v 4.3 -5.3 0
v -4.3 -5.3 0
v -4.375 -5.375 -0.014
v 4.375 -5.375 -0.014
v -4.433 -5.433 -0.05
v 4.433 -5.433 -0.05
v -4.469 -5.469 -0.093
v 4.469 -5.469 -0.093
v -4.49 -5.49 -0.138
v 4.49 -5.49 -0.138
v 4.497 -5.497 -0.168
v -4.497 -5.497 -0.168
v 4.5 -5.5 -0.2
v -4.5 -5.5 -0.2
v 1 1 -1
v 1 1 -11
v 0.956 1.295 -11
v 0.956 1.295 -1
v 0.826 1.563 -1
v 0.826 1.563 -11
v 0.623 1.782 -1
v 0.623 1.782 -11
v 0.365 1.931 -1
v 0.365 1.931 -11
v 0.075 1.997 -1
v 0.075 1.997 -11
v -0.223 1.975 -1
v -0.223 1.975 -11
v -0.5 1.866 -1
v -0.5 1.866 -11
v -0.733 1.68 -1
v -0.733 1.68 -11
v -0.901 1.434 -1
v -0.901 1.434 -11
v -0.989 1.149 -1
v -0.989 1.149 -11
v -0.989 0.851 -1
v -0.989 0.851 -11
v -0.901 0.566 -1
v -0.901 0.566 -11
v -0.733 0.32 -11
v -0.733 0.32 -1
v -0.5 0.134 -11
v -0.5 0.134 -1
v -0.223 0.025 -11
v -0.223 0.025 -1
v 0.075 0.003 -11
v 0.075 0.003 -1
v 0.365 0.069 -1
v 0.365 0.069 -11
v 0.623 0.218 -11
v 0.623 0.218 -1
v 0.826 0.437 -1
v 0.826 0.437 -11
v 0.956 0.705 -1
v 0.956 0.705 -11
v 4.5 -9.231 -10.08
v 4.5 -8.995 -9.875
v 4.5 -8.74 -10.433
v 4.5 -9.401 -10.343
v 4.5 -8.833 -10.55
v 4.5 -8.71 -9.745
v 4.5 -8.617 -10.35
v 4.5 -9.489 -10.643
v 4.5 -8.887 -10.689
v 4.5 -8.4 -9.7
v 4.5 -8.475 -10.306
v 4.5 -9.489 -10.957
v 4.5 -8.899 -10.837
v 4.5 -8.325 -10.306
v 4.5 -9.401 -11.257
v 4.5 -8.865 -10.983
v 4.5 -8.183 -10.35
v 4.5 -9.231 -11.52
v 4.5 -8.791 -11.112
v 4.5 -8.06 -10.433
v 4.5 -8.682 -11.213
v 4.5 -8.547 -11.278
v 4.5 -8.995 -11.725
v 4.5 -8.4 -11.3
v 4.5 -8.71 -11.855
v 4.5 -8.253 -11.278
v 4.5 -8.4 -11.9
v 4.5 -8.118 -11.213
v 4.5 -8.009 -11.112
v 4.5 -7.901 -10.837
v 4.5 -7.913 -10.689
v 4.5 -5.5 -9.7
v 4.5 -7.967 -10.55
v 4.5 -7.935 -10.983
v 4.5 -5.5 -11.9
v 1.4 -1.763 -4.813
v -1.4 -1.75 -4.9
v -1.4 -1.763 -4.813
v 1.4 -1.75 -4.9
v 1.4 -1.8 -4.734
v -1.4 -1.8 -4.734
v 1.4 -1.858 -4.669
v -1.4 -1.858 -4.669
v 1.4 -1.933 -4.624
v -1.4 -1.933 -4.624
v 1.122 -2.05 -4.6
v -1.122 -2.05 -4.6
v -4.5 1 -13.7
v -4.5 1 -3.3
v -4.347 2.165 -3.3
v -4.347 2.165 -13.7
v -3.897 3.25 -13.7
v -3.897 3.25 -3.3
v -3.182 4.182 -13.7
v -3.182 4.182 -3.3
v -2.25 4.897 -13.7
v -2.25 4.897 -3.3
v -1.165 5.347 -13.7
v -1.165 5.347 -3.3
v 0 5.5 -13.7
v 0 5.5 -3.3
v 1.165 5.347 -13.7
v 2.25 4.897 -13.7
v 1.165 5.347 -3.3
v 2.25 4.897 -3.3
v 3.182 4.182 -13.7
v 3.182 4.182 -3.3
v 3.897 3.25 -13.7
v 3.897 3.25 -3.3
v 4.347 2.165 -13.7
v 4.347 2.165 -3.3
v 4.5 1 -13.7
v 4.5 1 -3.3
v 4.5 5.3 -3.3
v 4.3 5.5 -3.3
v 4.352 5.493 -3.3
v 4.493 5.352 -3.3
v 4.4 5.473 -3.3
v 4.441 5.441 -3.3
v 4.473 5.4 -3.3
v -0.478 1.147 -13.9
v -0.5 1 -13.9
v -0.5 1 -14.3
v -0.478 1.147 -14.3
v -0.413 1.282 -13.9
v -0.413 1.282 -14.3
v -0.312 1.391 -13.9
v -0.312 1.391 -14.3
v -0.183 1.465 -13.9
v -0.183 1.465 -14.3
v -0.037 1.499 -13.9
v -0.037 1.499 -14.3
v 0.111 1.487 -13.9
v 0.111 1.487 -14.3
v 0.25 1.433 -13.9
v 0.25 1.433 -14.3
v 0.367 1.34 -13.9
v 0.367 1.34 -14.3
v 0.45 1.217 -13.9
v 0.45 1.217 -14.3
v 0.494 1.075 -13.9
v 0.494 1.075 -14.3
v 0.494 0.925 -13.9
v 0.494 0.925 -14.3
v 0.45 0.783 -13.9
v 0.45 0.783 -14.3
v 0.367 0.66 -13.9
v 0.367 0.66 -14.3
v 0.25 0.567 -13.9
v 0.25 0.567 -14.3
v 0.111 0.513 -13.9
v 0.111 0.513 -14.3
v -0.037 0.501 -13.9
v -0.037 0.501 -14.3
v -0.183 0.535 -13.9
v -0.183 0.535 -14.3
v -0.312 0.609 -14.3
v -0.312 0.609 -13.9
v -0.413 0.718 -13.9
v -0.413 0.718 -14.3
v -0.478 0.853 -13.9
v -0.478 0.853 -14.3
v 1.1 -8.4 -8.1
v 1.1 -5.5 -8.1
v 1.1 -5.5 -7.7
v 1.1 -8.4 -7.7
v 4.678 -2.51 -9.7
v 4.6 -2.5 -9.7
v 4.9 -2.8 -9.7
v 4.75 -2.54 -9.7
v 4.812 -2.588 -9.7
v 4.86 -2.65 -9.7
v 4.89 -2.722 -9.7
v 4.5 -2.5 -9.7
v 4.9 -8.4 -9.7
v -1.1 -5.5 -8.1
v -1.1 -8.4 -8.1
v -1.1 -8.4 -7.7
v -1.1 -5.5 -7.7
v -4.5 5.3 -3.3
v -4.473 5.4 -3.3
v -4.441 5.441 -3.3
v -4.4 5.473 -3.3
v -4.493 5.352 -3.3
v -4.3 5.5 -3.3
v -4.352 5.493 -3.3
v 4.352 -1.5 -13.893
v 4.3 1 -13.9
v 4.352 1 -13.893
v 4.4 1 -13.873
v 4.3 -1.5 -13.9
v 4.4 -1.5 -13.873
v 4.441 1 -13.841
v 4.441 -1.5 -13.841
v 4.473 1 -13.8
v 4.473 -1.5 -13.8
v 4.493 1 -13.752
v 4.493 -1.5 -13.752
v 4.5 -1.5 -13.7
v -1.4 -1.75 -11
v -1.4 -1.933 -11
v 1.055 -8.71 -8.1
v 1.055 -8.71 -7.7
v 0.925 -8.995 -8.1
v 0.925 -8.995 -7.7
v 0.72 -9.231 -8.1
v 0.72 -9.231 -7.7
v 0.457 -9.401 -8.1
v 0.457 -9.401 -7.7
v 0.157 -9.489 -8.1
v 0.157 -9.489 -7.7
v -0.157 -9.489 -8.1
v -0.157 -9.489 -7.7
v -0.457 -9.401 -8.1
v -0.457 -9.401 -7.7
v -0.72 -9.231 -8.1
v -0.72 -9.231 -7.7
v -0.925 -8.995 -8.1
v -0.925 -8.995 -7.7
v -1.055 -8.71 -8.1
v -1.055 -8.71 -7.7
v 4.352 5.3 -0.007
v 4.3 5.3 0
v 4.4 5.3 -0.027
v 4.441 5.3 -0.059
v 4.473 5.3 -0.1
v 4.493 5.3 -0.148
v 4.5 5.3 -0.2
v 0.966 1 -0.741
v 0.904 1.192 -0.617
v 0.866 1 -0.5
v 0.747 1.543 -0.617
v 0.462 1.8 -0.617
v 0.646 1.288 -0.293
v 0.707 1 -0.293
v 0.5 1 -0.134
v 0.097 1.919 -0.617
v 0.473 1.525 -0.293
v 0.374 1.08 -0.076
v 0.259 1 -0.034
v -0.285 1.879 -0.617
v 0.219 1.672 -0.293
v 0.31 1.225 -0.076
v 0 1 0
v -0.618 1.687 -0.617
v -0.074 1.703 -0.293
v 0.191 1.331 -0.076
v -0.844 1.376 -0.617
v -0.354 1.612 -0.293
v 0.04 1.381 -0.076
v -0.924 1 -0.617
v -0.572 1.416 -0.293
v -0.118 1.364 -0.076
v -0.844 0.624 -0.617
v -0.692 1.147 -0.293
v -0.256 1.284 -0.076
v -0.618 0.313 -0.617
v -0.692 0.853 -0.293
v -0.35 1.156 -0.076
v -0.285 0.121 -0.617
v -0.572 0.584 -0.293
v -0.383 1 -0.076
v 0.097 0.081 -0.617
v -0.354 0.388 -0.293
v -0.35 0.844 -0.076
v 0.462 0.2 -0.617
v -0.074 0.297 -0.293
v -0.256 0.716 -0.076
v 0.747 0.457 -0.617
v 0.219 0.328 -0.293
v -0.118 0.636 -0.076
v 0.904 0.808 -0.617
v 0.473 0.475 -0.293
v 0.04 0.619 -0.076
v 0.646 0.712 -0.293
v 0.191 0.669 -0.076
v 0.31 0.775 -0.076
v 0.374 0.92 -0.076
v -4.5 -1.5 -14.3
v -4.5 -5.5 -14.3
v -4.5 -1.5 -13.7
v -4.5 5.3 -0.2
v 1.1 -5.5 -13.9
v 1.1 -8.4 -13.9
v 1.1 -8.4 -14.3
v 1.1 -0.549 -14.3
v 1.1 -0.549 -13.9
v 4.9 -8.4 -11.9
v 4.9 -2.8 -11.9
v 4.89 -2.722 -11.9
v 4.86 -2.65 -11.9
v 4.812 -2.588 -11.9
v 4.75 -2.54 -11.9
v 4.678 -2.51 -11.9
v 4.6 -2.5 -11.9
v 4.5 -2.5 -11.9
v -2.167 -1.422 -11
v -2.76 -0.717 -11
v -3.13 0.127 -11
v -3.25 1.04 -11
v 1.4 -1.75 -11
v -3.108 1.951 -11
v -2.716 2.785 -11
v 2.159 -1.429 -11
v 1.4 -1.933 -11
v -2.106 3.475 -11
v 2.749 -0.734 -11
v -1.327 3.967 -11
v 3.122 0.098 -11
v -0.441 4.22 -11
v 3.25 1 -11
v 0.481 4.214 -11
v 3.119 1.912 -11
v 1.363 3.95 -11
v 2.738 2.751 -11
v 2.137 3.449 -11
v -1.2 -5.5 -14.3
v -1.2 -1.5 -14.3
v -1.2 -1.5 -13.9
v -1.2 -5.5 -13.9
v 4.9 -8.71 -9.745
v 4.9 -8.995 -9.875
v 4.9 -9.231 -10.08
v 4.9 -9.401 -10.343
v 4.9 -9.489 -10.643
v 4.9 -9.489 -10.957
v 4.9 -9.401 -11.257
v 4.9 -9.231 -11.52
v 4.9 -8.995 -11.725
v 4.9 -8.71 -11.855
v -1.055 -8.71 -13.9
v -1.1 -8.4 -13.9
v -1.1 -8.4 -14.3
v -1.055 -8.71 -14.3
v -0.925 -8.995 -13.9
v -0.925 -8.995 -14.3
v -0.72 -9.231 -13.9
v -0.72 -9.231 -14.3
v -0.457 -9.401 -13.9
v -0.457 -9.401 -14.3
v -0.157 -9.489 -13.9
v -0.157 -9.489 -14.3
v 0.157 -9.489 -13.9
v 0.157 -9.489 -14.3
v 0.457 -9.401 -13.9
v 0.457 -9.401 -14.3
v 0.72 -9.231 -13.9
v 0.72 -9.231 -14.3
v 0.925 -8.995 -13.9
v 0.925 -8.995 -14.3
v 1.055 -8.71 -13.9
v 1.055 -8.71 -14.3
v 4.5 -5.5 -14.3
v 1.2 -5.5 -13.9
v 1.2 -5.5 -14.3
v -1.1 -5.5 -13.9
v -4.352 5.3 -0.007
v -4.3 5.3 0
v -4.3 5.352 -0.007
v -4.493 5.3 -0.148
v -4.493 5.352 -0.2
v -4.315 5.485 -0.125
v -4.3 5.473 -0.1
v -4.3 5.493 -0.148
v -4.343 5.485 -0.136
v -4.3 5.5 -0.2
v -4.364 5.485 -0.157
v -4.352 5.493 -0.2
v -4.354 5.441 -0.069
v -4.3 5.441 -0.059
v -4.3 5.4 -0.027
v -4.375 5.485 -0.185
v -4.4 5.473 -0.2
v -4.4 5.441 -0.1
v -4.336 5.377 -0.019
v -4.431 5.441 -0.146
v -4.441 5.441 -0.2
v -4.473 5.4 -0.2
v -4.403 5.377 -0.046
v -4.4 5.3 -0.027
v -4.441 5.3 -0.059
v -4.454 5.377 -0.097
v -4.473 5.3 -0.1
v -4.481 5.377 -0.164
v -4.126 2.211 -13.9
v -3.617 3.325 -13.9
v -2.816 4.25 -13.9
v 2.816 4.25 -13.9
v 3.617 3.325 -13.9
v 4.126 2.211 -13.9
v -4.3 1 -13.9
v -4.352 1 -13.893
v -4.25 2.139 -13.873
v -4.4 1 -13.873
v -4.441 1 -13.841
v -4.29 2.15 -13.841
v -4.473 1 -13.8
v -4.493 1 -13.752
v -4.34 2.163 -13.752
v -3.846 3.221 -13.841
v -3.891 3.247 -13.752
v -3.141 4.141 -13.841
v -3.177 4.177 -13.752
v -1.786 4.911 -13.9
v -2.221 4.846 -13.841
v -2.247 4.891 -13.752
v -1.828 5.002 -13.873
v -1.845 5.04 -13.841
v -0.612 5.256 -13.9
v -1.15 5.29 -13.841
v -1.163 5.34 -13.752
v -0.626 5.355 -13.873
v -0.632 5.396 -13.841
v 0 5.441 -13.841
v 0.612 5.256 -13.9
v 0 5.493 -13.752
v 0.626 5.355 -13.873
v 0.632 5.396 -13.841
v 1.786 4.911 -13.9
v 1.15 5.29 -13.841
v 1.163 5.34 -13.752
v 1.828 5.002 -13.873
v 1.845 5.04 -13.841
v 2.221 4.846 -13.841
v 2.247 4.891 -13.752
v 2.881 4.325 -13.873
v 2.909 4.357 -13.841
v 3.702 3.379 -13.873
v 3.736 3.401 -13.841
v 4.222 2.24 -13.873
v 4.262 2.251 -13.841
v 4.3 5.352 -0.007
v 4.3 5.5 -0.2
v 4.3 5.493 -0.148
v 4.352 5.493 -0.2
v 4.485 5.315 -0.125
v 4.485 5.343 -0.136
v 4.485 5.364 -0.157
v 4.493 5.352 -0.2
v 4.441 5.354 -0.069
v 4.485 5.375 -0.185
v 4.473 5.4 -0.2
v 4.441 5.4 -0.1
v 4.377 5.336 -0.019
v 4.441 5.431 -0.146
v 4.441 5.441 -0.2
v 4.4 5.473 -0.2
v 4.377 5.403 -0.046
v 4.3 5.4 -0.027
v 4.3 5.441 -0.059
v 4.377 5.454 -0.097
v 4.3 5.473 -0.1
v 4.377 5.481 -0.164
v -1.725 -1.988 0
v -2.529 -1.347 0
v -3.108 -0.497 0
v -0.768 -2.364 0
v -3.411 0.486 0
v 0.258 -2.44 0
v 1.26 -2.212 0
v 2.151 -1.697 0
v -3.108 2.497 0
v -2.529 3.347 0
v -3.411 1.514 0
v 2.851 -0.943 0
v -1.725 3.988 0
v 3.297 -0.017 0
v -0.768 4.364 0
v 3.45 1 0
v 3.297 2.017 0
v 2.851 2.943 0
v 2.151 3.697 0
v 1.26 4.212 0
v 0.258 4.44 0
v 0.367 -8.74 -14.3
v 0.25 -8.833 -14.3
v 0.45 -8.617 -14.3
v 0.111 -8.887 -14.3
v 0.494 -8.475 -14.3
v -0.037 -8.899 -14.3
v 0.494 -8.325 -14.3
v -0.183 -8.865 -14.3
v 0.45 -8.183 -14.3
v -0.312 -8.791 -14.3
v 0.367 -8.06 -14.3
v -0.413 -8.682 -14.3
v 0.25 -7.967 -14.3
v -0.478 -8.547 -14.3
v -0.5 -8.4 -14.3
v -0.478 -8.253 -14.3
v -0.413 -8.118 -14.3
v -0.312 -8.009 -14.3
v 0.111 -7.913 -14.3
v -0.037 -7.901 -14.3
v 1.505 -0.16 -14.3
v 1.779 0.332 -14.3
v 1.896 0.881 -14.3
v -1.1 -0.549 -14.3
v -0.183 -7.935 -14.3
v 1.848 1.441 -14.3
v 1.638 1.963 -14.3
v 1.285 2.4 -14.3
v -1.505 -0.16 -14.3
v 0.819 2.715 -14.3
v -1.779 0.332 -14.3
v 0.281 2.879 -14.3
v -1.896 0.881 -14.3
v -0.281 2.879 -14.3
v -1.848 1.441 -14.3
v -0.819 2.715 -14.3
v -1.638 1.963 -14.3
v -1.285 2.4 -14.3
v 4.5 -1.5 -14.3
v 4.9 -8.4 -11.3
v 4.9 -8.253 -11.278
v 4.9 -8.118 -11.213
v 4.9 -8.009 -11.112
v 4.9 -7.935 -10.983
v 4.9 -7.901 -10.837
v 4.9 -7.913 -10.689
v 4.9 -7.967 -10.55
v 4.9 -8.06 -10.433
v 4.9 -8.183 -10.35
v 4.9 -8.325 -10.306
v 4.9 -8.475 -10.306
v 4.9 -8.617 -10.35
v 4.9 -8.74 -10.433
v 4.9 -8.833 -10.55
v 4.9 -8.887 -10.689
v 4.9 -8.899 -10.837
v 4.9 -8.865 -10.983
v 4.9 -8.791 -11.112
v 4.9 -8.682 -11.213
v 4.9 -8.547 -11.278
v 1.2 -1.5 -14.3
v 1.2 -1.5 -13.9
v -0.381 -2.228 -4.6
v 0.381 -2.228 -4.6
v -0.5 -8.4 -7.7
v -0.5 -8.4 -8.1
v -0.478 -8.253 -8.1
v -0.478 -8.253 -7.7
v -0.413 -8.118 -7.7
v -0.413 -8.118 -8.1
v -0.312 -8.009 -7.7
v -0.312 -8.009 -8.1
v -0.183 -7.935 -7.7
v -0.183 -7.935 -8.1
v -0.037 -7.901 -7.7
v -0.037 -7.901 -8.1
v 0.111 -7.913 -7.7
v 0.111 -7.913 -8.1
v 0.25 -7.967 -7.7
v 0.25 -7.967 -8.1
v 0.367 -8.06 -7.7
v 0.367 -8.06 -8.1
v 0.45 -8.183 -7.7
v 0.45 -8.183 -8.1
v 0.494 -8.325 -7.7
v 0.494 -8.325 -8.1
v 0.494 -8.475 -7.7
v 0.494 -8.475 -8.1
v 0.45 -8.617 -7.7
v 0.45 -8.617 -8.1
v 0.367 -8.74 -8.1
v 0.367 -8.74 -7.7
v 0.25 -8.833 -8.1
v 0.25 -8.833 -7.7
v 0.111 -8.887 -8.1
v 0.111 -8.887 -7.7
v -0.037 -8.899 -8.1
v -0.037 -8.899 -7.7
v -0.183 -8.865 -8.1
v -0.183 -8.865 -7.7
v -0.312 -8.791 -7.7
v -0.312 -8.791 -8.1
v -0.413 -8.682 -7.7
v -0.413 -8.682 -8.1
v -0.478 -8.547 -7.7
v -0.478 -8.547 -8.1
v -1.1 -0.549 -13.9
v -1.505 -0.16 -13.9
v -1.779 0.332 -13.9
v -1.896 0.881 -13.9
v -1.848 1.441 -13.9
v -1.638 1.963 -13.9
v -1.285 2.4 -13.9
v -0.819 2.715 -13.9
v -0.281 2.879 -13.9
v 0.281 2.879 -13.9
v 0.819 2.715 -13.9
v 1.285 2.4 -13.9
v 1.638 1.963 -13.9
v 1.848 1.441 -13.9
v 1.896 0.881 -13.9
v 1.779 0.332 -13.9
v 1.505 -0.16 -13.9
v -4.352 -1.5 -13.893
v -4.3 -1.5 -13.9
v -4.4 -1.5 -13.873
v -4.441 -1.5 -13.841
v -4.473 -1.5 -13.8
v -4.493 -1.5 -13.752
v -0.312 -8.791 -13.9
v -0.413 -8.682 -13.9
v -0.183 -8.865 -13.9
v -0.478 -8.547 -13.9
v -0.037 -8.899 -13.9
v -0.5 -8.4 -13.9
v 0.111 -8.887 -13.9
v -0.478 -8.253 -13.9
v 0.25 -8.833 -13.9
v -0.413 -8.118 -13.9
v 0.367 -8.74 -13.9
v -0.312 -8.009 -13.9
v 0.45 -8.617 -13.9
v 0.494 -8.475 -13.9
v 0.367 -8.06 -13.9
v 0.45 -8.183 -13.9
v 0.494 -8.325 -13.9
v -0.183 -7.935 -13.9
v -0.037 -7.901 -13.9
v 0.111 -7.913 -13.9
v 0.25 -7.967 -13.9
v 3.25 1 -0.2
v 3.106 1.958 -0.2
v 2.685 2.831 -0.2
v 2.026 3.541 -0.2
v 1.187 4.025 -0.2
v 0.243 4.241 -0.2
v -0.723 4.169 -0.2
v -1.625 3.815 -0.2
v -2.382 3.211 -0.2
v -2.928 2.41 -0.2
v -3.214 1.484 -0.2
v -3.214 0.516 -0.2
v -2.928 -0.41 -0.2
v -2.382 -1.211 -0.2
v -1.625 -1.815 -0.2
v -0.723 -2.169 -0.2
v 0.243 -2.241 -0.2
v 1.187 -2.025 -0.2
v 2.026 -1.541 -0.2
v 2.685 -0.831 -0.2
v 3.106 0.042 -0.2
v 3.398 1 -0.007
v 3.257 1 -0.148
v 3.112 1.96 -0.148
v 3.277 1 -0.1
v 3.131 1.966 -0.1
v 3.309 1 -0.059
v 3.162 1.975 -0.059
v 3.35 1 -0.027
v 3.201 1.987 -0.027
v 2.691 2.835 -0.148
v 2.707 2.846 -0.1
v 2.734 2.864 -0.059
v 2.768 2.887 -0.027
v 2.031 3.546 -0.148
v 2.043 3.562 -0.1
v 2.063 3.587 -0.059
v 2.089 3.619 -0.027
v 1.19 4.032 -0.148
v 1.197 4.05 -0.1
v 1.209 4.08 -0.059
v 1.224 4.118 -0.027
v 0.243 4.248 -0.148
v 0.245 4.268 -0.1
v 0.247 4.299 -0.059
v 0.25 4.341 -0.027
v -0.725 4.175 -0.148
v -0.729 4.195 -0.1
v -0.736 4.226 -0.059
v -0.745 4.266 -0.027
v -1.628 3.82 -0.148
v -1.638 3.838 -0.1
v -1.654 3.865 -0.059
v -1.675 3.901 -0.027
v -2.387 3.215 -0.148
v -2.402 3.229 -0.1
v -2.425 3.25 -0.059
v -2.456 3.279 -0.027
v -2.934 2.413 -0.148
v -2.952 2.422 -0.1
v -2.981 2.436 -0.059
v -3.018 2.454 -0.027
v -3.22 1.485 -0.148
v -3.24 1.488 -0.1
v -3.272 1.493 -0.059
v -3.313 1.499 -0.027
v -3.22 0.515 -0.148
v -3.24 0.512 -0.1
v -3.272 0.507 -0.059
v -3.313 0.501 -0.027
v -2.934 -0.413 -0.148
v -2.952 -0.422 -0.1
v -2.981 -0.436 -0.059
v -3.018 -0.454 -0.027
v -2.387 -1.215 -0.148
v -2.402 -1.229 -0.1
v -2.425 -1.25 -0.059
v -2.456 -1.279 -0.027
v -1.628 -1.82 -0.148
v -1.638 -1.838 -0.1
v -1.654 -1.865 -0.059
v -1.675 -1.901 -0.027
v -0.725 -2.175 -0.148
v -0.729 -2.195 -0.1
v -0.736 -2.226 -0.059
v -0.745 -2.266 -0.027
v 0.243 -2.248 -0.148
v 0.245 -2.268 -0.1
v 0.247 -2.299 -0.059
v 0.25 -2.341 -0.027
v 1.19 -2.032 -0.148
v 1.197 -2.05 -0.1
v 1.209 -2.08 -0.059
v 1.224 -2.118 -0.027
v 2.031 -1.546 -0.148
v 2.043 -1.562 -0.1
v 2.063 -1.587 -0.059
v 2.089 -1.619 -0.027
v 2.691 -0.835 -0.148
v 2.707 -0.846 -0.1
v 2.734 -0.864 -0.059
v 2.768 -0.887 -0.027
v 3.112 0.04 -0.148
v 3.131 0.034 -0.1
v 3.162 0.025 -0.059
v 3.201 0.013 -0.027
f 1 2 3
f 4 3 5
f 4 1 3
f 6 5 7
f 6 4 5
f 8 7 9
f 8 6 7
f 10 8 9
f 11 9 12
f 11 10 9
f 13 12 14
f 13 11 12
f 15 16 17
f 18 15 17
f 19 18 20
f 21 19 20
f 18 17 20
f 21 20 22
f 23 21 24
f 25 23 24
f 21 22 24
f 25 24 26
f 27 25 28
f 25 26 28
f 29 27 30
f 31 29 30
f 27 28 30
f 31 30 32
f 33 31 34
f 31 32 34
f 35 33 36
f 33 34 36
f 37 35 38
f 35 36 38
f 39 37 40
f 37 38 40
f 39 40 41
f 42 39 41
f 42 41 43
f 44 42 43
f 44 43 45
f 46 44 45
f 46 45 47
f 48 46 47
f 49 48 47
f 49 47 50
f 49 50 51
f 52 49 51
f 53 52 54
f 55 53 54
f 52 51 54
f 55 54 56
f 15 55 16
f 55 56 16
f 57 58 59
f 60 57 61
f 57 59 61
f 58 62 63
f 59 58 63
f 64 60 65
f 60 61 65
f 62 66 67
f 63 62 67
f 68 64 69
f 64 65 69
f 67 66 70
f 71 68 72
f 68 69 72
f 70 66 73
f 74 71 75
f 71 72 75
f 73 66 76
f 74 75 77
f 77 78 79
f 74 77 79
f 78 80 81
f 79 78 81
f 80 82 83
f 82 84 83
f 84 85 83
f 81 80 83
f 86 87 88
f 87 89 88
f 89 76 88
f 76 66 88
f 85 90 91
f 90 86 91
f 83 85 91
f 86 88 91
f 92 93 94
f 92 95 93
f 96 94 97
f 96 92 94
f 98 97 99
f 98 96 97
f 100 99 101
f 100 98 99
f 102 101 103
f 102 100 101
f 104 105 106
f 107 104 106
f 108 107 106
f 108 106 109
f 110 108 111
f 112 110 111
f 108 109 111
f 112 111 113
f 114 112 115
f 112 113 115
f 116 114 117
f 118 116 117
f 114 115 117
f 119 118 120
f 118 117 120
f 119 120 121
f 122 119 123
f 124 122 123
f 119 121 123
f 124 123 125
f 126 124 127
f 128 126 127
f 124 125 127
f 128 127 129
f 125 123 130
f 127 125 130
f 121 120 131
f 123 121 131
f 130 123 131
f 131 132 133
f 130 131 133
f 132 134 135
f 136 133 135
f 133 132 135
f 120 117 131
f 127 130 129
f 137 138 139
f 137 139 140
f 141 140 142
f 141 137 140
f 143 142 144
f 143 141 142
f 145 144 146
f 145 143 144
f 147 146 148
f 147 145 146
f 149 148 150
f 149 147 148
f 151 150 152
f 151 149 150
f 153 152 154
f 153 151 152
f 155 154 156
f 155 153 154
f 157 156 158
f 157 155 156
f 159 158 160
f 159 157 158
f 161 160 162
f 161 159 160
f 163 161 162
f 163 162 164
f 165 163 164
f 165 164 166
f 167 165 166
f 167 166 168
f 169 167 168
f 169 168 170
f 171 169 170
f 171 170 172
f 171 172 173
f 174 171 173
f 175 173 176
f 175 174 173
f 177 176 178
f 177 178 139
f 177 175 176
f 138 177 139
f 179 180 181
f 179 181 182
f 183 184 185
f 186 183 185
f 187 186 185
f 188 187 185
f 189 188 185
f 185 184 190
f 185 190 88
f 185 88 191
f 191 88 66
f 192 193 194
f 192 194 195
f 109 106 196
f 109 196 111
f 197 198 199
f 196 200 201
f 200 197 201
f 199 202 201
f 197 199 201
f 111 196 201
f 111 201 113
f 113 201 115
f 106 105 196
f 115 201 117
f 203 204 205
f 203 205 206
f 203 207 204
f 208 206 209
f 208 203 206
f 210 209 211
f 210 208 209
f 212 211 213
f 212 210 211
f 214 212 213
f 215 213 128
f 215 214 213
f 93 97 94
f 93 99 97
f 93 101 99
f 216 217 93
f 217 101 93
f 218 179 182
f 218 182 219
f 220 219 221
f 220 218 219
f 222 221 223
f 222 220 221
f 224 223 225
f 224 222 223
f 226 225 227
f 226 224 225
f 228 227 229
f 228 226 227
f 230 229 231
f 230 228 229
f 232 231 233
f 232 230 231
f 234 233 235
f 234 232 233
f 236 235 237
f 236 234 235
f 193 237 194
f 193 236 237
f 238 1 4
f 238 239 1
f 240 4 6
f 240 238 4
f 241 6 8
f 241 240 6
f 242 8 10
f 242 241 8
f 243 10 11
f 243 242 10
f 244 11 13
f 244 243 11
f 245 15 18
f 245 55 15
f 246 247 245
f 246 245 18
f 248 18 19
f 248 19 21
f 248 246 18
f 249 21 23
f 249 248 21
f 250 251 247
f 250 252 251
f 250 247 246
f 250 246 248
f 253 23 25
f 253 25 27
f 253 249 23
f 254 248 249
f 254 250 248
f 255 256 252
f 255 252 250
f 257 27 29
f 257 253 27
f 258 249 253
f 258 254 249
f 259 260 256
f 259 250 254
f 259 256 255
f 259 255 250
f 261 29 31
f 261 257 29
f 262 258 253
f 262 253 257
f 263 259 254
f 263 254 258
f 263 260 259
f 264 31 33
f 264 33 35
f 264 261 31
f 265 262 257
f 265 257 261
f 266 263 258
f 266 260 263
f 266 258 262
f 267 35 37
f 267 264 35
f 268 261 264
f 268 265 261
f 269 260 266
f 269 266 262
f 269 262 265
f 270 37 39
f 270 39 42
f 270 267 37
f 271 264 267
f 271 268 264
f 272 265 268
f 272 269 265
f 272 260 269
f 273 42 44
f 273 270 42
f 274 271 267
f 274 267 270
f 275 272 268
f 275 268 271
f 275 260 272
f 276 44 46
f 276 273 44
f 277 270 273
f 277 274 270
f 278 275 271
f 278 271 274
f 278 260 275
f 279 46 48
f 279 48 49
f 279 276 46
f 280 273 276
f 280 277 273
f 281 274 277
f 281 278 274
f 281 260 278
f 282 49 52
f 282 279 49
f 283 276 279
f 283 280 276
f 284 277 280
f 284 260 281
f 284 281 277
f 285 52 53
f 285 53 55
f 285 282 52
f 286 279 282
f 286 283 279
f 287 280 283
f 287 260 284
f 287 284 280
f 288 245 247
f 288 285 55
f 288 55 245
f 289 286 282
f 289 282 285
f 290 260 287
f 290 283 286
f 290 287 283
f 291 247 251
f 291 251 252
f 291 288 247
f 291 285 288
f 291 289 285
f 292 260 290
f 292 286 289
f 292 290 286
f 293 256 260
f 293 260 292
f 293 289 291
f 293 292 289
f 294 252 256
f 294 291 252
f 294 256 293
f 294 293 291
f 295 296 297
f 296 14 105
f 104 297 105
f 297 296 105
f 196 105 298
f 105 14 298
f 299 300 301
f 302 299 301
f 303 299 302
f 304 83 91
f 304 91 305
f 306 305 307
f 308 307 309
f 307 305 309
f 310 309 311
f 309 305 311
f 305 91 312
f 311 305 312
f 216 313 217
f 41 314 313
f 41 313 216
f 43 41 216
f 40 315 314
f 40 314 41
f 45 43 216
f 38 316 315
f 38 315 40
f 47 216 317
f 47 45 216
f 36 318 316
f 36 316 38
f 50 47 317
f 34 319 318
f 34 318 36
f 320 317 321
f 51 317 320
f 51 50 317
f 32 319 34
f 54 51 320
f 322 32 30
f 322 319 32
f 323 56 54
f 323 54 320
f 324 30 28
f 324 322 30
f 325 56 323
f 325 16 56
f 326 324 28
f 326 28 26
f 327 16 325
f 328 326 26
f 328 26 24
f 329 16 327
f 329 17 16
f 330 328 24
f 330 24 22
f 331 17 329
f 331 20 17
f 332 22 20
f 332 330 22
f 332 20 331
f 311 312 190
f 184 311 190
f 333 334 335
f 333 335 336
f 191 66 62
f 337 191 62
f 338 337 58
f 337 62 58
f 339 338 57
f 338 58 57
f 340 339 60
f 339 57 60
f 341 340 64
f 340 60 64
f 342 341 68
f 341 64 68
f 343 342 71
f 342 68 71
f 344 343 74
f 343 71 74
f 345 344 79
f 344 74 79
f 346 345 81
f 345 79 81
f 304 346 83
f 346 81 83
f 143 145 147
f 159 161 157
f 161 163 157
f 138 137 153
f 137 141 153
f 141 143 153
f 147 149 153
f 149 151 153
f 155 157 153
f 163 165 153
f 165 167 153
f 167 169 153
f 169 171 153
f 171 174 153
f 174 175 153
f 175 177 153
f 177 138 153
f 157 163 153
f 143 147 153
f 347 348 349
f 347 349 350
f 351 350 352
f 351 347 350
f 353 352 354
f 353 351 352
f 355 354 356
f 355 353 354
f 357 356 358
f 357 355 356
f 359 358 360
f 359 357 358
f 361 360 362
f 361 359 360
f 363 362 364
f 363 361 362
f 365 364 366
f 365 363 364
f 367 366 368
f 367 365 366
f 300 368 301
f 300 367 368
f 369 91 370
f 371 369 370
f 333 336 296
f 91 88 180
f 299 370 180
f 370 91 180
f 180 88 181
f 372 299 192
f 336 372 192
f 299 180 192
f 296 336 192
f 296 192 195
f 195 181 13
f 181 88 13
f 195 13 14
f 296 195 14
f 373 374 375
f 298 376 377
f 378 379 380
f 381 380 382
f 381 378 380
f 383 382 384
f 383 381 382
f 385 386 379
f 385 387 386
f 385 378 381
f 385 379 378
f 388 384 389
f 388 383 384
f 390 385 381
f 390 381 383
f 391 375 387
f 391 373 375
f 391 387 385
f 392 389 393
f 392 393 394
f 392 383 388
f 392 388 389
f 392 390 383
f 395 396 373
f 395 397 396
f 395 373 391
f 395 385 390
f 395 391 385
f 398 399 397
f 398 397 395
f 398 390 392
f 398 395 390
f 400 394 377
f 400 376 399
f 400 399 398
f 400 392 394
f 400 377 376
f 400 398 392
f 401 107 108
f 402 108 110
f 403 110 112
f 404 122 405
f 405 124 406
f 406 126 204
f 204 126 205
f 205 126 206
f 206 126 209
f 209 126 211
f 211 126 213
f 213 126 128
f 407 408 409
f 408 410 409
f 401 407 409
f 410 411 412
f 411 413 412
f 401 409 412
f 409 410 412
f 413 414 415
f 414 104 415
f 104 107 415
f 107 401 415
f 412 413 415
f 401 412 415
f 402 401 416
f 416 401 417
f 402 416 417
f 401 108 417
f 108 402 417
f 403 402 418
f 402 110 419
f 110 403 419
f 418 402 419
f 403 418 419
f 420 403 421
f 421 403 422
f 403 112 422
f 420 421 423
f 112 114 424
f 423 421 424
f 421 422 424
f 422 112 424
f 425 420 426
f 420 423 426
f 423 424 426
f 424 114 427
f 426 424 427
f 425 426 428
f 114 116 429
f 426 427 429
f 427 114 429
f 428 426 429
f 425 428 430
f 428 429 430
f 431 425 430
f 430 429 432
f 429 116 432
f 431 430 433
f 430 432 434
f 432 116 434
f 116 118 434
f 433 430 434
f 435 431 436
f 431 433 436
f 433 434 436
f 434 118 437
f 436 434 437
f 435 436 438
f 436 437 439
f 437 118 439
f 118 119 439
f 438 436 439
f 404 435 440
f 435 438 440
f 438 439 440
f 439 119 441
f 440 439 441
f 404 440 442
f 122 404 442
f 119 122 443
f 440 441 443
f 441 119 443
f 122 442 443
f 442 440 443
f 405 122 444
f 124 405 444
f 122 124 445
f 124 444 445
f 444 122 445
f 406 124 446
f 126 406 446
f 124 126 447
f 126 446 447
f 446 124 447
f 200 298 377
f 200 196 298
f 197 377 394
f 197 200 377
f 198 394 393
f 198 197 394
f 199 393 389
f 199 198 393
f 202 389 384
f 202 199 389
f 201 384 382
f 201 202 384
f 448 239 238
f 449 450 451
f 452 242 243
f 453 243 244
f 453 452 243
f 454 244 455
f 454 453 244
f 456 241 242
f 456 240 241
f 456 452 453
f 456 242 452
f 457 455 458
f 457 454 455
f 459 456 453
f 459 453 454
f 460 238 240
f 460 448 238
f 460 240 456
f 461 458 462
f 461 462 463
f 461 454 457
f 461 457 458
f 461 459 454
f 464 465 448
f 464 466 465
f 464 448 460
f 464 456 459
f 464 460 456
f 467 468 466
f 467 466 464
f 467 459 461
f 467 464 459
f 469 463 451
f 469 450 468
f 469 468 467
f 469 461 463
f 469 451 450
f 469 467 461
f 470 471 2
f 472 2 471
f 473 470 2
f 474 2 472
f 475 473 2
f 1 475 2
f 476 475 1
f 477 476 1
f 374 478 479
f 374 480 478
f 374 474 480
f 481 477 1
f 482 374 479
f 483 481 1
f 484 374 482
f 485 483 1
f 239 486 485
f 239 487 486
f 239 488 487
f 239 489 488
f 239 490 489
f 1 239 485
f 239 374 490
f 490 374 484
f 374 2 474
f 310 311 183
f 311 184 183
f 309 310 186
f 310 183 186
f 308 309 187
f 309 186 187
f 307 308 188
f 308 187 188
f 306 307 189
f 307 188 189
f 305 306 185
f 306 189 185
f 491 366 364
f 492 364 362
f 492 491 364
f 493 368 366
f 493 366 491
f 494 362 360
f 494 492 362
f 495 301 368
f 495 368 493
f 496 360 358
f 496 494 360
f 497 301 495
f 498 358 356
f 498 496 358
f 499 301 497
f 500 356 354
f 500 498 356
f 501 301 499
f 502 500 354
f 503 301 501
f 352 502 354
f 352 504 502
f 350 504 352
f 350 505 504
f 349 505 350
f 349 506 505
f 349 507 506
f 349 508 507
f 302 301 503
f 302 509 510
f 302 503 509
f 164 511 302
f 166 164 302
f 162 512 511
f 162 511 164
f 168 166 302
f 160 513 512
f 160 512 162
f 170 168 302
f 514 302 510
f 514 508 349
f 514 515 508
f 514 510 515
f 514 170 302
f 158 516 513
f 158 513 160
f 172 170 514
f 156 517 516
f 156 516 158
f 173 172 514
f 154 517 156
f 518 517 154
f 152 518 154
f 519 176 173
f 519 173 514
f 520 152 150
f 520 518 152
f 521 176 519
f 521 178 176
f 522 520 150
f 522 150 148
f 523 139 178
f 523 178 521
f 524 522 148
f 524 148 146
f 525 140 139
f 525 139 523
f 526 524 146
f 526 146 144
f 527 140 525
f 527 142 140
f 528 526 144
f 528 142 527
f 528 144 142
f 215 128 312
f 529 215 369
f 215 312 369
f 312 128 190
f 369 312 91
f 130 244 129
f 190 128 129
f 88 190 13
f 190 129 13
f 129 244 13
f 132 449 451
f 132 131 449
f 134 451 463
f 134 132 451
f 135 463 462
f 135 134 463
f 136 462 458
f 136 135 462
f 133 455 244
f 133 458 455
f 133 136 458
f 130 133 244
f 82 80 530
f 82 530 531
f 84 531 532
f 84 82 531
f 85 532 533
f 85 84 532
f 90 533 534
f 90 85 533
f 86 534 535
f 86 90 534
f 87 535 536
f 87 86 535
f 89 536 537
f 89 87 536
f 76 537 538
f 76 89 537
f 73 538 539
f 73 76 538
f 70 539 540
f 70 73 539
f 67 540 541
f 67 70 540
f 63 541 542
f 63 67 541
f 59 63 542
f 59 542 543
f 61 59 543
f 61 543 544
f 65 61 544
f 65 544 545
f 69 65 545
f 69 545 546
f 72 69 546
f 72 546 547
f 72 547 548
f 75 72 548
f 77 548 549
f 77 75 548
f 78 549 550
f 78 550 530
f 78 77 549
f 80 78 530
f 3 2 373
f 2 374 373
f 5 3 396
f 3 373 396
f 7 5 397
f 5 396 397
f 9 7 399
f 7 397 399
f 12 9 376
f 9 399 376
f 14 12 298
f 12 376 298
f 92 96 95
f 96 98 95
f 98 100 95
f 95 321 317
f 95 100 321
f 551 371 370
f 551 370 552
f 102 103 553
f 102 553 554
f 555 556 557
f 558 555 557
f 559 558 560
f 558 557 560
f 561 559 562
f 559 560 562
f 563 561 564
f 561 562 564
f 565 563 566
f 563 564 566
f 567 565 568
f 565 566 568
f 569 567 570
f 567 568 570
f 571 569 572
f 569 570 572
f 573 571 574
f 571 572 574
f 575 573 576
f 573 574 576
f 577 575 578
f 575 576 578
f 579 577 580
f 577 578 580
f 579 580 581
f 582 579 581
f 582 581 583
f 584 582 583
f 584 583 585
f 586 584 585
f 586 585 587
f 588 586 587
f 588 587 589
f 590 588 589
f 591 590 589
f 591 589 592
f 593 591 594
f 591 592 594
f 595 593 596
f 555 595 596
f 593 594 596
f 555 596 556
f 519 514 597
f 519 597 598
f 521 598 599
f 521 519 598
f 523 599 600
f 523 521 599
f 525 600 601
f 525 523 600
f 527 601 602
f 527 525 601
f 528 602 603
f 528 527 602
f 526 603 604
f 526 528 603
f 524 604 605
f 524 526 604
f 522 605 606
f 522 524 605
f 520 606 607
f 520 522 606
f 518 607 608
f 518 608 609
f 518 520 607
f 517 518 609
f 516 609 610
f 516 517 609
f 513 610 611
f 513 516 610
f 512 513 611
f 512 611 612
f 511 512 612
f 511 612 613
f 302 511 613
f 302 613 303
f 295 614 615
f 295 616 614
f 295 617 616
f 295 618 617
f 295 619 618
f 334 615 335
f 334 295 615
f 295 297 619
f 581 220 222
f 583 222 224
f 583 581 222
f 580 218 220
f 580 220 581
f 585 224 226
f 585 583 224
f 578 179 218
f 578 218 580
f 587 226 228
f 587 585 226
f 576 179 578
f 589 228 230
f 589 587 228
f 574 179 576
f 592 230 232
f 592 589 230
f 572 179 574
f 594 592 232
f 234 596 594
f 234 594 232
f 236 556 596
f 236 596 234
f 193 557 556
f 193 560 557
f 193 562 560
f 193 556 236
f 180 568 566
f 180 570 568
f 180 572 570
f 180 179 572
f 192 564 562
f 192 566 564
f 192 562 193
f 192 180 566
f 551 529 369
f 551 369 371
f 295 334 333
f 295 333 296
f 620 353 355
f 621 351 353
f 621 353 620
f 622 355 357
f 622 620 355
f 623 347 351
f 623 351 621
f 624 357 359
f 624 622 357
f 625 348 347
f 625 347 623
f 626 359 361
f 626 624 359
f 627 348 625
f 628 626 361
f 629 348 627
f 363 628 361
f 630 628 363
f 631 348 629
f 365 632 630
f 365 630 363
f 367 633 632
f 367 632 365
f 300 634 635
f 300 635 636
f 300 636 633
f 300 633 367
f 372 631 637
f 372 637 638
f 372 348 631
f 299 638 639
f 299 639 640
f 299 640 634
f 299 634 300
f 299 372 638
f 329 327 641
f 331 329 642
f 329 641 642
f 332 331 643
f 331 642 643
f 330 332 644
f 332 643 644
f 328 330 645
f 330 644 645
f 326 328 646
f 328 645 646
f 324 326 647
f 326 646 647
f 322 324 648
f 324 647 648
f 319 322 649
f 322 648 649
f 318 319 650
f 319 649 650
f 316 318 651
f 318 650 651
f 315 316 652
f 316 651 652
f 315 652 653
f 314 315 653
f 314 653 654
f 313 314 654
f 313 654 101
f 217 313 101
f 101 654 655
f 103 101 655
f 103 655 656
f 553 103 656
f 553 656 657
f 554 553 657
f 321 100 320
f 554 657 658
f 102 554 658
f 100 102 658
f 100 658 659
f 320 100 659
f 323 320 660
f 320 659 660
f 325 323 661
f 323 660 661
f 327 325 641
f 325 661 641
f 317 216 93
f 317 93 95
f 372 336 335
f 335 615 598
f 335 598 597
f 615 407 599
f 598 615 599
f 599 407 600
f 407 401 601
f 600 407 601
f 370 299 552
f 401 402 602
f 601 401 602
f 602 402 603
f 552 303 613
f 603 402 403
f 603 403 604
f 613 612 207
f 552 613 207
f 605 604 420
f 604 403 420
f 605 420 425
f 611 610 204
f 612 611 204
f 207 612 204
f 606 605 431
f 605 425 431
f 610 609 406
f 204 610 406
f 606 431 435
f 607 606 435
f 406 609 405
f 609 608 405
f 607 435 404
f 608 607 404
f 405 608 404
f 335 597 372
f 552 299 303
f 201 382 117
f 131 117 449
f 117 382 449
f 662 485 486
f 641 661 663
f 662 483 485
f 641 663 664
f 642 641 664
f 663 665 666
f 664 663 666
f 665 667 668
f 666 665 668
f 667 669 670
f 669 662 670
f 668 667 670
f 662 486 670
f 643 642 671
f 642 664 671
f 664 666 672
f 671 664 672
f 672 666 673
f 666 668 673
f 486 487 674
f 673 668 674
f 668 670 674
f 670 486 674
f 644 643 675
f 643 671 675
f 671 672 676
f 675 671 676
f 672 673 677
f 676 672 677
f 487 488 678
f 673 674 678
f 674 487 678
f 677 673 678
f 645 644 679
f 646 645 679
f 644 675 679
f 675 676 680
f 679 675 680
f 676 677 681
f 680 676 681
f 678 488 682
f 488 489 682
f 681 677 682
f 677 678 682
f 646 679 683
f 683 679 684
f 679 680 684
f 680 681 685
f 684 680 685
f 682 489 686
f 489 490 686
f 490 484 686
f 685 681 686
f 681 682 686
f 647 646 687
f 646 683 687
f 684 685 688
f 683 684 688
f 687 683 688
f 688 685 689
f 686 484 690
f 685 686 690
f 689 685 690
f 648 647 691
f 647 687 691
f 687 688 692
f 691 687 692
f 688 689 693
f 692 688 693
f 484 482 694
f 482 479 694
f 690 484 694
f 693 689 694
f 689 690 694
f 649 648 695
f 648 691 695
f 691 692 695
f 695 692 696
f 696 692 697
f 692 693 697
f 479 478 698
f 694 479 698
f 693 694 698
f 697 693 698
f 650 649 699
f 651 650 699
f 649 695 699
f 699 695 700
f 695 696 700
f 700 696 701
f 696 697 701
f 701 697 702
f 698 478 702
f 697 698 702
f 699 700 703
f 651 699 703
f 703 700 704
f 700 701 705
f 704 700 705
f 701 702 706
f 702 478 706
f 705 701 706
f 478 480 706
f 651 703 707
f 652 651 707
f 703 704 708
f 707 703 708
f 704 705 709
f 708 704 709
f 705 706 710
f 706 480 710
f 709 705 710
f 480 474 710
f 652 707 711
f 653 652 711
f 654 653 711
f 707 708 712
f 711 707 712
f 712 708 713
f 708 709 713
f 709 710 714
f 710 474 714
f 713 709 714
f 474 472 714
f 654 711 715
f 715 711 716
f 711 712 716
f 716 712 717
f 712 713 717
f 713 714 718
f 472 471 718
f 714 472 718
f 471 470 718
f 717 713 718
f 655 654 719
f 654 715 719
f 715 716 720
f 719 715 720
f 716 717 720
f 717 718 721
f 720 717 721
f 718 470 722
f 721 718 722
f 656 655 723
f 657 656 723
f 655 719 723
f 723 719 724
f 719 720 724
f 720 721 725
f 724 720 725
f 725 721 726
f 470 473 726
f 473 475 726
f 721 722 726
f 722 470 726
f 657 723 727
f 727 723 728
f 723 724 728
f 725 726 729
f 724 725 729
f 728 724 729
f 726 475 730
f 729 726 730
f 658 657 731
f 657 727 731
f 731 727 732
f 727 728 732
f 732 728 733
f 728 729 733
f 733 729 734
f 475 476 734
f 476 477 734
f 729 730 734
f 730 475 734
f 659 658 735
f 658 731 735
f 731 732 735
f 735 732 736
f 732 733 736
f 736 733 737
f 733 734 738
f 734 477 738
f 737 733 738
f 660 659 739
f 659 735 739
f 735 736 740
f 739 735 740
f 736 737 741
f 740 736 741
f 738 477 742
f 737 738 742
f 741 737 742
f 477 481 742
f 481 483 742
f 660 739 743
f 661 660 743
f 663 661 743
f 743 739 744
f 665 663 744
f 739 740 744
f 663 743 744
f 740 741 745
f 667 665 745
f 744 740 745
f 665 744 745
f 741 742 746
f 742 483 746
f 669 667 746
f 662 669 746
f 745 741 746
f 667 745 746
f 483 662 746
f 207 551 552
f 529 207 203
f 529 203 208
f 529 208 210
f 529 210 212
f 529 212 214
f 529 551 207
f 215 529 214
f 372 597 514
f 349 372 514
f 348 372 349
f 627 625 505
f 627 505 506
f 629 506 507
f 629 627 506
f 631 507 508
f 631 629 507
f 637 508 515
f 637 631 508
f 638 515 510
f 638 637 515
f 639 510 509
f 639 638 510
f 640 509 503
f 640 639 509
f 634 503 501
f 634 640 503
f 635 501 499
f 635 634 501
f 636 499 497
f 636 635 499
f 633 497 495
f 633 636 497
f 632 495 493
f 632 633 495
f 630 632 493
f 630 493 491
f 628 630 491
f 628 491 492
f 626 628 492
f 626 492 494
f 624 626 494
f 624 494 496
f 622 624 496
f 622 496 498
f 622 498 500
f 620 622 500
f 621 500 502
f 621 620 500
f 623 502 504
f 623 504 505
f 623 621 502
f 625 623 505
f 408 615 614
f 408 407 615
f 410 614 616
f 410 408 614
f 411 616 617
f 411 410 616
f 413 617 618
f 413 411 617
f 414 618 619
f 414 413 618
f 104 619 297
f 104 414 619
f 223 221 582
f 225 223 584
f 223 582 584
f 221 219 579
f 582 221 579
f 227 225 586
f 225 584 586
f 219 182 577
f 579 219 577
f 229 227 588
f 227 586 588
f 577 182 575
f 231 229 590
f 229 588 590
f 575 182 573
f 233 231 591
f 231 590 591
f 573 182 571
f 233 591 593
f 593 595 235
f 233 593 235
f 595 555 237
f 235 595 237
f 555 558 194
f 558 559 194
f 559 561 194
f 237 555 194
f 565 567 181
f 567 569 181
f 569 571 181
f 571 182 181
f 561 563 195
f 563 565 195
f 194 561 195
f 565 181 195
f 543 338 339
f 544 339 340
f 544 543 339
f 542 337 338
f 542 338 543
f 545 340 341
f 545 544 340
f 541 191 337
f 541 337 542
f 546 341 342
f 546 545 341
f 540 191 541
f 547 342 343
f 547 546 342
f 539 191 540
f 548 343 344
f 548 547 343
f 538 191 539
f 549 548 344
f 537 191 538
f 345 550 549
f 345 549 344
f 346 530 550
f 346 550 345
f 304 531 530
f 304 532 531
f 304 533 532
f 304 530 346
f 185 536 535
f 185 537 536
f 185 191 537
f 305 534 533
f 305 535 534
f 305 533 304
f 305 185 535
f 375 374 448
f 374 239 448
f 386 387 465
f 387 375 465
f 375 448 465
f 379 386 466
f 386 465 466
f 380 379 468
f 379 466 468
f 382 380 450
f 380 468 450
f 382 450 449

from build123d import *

# Parameters (mm, degrees)
SKETCH1_W           = 9
SKETCH1_H           = 11
BOSS_EXTRUDE1_DEPTH = 3.3
BOSS_EXTRUDE2_DEPTH = 11
SKETCH3_R           = 3.25
CUT_EXTRUDE1_DEPTH  = 11
SKETCH4_R           = 1
BOSS_EXTRUDE3_DEPTH = 11
FILLET1_R           = 1
FILLET2_R           = 0.2
CUT_EXTRUDE2_DEPTH  = 0.4
SKETCH6_R           = 0.5
BOSS_EXTRUDE4_DEPTH = 0.4
SKETCH7_R           = 1.9
SKETCH7_R_2         = 0.5
BOSS_EXTRUDE5_DEPTH = 0.4
SKETCH8_R           = 0.5
BOSS_EXTRUDE6_DEPTH = 0.4
SKETCH9_R           = 0.5
BOSS_EXTRUDE7_DEPTH = 0.4
SKETCH10_W          = 2.8
SKETCH10_H          = 1
BOSS_EXTRUDE8_DEPTH = 6.4
FILLET3_R           = 0.3
FILLET4_R           = 0.2


with BuildPart() as part:
    # Sketch1 → Boss-Extrude1 (new body)
    with BuildSketch(Plane.XY):
        Rectangle(SKETCH1_W, SKETCH1_H)
    extrude(amount=-BOSS_EXTRUDE1_DEPTH)

    # Sketch2 → Boss-Extrude2 (add)
    with BuildSketch(Plane(origin=(0, 0, -3.3), x_dir=(-1, 0, 0), z_dir=(0, 0, -1))):
        with BuildLine():
            Line((-4.5, -5.5), (4.5, -5.5))
            Line((4.5, -5.5), (4.5, 1))
            ThreePointArc((4.5, 1), (0, 5.5), (-4.5, 1))
            Line((-4.5, 1), (-4.5, -5.5))
        make_face()
    extrude(amount=BOSS_EXTRUDE2_DEPTH)

    # Sketch3 → Cut-Extrude1 (cut)
    with BuildSketch(Plane.XY):
        with Locations((0, 1)):
            Circle(SKETCH3_R)
    extrude(amount=-CUT_EXTRUDE1_DEPTH, mode=Mode.SUBTRACT)

    # Sketch4 → Boss-Extrude3 (add)
    with BuildSketch(Plane.XY.offset(-11)):
        with Locations((0, 1)):
            Circle(SKETCH4_R)
    extrude(amount=BOSS_EXTRUDE3_DEPTH)

    # Fillet1
    fillet1_edges = [part.edges().sort_by_distance(p)[0] for p in [
        (-1, 1, 0),
    ]]
    fillet(fillet1_edges, radius=FILLET1_R)

    # Fillet2
    fillet2_edges = [part.edges().sort_by_distance(p)[0] for p in [
        (-3.25, 1, 0),
        (0, -5.5, 0),
        (-4.5, 0, 0),
        (0, 5.5, 0),
        (4.5, 0, 0),
        (-4.5, 5.5, -1.65),
        (4.5, 5.5, -1.65),
    ]]
    fillet(fillet2_edges, radius=FILLET2_R)

    # Sketch5 → Cut-Extrude2 (cut)
    with BuildSketch(Plane(origin=(0, 0, -14.3), x_dir=(-1, 0, 0), z_dir=(0, 0, -1))):
        Polygon((4.5, -1.5), (1.2, -1.5), (1.2, -5.5), (-1.2, -5.5), (-1.2, -1.5), (-4.5, -1.5), (-4.5, 5.5), (4.5, 5.5), align=None)
    extrude(amount=-CUT_EXTRUDE2_DEPTH, mode=Mode.SUBTRACT)

    # Sketch6 → Boss-Extrude4 (add)
    with BuildSketch(Plane(origin=(0, 0, -13.9), x_dir=(-1, 0, 0), z_dir=(0, 0, -1))):
        with BuildLine():
            Line((-1.1, -8.4), (-1.1, 1))
            ThreePointArc((-1.1, 1), (0, 2.1), (1.1, 1))
            Line((1.1, 1), (1.1, -8.4))
            ThreePointArc((1.1, -8.4), (0, -9.5), (-1.1, -8.4))
        make_face()
        with Locations((0, -8.4)):
            Circle(SKETCH6_R, mode=Mode.SUBTRACT)
        with Locations((0, 1)):
            Circle(SKETCH6_R, mode=Mode.SUBTRACT)
    extrude(amount=BOSS_EXTRUDE4_DEPTH)

    # Sketch7 → Boss-Extrude5 (add)
    with BuildSketch(Plane(origin=(0, 0, -14.3), x_dir=(-1, 0, 0), z_dir=(0, 0, -1))):
        with Locations((0, 1)):
            Circle(SKETCH7_R)
        with Locations((0, 1)):
            Circle(SKETCH7_R_2, mode=Mode.SUBTRACT)
    extrude(amount=-BOSS_EXTRUDE5_DEPTH)

    # Sketch8 → Boss-Extrude6 (add)
    with BuildSketch(Plane(origin=(0, 0, -8.1), x_dir=(-1, 0, 0), z_dir=(0, 0, -1))):
        with BuildLine():
            Line((-1.1, -5.145239298), (-1.1, -8.4))
            ThreePointArc((-1.1, -8.4), (0, -9.5), (1.1, -8.4))
            Line((1.1, -8.4), (1.1, -5.145239298))
            Line((1.1, -5.145239298), (-1.1, -5.145239298))
        make_face()
        with Locations((0, -8.4)):
            Circle(SKETCH8_R, mode=Mode.SUBTRACT)
    extrude(amount=-BOSS_EXTRUDE6_DEPTH)

    # Sketch9 → Boss-Extrude7 (add)
    with BuildSketch(Plane(origin=(4.5, 0, 0), x_dir=(0, 0, -1), z_dir=(1, 0, 0))):
        with BuildLine():
            Line((9.7, -2.5), (9.7, -8.4))
            ThreePointArc((9.7, -8.4), (10.8, -9.5), (11.9, -8.4))
            Line((11.9, -8.4), (11.9, -2.5))
            Line((11.9, -2.5), (9.7, -2.5))
        make_face()
        with Locations((10.8, -8.4)):
            Circle(SKETCH9_R, mode=Mode.SUBTRACT)
    extrude(amount=BOSS_EXTRUDE7_DEPTH)

    # Sketch10 → Boss-Extrude8 (add)
    with BuildSketch(Plane.XY.offset(-11)):
        with Locations((0, -2.25)):
            Rectangle(SKETCH10_W, SKETCH10_H)
    extrude(amount=BOSS_EXTRUDE8_DEPTH)

    # Fillet3
    fillet3_edges = [part.edges().sort_by_distance(p)[0] for p in [
        (4.9, -2.5, -10.8),
        (0, -1.75, -4.6),
    ]]
    fillet(fillet3_edges, radius=FILLET3_R)

    # Fillet4
    fillet4_edges = [part.edges().sort_by_distance(p)[0] for p in [
        (0, 5.5, -13.9),
        (4.5, -0.25, -13.9),
        (-4.5, -0.25, -13.9),
    ]]
    fillet(fillet4_edges, radius=FILLET4_R)


solid = part.part
